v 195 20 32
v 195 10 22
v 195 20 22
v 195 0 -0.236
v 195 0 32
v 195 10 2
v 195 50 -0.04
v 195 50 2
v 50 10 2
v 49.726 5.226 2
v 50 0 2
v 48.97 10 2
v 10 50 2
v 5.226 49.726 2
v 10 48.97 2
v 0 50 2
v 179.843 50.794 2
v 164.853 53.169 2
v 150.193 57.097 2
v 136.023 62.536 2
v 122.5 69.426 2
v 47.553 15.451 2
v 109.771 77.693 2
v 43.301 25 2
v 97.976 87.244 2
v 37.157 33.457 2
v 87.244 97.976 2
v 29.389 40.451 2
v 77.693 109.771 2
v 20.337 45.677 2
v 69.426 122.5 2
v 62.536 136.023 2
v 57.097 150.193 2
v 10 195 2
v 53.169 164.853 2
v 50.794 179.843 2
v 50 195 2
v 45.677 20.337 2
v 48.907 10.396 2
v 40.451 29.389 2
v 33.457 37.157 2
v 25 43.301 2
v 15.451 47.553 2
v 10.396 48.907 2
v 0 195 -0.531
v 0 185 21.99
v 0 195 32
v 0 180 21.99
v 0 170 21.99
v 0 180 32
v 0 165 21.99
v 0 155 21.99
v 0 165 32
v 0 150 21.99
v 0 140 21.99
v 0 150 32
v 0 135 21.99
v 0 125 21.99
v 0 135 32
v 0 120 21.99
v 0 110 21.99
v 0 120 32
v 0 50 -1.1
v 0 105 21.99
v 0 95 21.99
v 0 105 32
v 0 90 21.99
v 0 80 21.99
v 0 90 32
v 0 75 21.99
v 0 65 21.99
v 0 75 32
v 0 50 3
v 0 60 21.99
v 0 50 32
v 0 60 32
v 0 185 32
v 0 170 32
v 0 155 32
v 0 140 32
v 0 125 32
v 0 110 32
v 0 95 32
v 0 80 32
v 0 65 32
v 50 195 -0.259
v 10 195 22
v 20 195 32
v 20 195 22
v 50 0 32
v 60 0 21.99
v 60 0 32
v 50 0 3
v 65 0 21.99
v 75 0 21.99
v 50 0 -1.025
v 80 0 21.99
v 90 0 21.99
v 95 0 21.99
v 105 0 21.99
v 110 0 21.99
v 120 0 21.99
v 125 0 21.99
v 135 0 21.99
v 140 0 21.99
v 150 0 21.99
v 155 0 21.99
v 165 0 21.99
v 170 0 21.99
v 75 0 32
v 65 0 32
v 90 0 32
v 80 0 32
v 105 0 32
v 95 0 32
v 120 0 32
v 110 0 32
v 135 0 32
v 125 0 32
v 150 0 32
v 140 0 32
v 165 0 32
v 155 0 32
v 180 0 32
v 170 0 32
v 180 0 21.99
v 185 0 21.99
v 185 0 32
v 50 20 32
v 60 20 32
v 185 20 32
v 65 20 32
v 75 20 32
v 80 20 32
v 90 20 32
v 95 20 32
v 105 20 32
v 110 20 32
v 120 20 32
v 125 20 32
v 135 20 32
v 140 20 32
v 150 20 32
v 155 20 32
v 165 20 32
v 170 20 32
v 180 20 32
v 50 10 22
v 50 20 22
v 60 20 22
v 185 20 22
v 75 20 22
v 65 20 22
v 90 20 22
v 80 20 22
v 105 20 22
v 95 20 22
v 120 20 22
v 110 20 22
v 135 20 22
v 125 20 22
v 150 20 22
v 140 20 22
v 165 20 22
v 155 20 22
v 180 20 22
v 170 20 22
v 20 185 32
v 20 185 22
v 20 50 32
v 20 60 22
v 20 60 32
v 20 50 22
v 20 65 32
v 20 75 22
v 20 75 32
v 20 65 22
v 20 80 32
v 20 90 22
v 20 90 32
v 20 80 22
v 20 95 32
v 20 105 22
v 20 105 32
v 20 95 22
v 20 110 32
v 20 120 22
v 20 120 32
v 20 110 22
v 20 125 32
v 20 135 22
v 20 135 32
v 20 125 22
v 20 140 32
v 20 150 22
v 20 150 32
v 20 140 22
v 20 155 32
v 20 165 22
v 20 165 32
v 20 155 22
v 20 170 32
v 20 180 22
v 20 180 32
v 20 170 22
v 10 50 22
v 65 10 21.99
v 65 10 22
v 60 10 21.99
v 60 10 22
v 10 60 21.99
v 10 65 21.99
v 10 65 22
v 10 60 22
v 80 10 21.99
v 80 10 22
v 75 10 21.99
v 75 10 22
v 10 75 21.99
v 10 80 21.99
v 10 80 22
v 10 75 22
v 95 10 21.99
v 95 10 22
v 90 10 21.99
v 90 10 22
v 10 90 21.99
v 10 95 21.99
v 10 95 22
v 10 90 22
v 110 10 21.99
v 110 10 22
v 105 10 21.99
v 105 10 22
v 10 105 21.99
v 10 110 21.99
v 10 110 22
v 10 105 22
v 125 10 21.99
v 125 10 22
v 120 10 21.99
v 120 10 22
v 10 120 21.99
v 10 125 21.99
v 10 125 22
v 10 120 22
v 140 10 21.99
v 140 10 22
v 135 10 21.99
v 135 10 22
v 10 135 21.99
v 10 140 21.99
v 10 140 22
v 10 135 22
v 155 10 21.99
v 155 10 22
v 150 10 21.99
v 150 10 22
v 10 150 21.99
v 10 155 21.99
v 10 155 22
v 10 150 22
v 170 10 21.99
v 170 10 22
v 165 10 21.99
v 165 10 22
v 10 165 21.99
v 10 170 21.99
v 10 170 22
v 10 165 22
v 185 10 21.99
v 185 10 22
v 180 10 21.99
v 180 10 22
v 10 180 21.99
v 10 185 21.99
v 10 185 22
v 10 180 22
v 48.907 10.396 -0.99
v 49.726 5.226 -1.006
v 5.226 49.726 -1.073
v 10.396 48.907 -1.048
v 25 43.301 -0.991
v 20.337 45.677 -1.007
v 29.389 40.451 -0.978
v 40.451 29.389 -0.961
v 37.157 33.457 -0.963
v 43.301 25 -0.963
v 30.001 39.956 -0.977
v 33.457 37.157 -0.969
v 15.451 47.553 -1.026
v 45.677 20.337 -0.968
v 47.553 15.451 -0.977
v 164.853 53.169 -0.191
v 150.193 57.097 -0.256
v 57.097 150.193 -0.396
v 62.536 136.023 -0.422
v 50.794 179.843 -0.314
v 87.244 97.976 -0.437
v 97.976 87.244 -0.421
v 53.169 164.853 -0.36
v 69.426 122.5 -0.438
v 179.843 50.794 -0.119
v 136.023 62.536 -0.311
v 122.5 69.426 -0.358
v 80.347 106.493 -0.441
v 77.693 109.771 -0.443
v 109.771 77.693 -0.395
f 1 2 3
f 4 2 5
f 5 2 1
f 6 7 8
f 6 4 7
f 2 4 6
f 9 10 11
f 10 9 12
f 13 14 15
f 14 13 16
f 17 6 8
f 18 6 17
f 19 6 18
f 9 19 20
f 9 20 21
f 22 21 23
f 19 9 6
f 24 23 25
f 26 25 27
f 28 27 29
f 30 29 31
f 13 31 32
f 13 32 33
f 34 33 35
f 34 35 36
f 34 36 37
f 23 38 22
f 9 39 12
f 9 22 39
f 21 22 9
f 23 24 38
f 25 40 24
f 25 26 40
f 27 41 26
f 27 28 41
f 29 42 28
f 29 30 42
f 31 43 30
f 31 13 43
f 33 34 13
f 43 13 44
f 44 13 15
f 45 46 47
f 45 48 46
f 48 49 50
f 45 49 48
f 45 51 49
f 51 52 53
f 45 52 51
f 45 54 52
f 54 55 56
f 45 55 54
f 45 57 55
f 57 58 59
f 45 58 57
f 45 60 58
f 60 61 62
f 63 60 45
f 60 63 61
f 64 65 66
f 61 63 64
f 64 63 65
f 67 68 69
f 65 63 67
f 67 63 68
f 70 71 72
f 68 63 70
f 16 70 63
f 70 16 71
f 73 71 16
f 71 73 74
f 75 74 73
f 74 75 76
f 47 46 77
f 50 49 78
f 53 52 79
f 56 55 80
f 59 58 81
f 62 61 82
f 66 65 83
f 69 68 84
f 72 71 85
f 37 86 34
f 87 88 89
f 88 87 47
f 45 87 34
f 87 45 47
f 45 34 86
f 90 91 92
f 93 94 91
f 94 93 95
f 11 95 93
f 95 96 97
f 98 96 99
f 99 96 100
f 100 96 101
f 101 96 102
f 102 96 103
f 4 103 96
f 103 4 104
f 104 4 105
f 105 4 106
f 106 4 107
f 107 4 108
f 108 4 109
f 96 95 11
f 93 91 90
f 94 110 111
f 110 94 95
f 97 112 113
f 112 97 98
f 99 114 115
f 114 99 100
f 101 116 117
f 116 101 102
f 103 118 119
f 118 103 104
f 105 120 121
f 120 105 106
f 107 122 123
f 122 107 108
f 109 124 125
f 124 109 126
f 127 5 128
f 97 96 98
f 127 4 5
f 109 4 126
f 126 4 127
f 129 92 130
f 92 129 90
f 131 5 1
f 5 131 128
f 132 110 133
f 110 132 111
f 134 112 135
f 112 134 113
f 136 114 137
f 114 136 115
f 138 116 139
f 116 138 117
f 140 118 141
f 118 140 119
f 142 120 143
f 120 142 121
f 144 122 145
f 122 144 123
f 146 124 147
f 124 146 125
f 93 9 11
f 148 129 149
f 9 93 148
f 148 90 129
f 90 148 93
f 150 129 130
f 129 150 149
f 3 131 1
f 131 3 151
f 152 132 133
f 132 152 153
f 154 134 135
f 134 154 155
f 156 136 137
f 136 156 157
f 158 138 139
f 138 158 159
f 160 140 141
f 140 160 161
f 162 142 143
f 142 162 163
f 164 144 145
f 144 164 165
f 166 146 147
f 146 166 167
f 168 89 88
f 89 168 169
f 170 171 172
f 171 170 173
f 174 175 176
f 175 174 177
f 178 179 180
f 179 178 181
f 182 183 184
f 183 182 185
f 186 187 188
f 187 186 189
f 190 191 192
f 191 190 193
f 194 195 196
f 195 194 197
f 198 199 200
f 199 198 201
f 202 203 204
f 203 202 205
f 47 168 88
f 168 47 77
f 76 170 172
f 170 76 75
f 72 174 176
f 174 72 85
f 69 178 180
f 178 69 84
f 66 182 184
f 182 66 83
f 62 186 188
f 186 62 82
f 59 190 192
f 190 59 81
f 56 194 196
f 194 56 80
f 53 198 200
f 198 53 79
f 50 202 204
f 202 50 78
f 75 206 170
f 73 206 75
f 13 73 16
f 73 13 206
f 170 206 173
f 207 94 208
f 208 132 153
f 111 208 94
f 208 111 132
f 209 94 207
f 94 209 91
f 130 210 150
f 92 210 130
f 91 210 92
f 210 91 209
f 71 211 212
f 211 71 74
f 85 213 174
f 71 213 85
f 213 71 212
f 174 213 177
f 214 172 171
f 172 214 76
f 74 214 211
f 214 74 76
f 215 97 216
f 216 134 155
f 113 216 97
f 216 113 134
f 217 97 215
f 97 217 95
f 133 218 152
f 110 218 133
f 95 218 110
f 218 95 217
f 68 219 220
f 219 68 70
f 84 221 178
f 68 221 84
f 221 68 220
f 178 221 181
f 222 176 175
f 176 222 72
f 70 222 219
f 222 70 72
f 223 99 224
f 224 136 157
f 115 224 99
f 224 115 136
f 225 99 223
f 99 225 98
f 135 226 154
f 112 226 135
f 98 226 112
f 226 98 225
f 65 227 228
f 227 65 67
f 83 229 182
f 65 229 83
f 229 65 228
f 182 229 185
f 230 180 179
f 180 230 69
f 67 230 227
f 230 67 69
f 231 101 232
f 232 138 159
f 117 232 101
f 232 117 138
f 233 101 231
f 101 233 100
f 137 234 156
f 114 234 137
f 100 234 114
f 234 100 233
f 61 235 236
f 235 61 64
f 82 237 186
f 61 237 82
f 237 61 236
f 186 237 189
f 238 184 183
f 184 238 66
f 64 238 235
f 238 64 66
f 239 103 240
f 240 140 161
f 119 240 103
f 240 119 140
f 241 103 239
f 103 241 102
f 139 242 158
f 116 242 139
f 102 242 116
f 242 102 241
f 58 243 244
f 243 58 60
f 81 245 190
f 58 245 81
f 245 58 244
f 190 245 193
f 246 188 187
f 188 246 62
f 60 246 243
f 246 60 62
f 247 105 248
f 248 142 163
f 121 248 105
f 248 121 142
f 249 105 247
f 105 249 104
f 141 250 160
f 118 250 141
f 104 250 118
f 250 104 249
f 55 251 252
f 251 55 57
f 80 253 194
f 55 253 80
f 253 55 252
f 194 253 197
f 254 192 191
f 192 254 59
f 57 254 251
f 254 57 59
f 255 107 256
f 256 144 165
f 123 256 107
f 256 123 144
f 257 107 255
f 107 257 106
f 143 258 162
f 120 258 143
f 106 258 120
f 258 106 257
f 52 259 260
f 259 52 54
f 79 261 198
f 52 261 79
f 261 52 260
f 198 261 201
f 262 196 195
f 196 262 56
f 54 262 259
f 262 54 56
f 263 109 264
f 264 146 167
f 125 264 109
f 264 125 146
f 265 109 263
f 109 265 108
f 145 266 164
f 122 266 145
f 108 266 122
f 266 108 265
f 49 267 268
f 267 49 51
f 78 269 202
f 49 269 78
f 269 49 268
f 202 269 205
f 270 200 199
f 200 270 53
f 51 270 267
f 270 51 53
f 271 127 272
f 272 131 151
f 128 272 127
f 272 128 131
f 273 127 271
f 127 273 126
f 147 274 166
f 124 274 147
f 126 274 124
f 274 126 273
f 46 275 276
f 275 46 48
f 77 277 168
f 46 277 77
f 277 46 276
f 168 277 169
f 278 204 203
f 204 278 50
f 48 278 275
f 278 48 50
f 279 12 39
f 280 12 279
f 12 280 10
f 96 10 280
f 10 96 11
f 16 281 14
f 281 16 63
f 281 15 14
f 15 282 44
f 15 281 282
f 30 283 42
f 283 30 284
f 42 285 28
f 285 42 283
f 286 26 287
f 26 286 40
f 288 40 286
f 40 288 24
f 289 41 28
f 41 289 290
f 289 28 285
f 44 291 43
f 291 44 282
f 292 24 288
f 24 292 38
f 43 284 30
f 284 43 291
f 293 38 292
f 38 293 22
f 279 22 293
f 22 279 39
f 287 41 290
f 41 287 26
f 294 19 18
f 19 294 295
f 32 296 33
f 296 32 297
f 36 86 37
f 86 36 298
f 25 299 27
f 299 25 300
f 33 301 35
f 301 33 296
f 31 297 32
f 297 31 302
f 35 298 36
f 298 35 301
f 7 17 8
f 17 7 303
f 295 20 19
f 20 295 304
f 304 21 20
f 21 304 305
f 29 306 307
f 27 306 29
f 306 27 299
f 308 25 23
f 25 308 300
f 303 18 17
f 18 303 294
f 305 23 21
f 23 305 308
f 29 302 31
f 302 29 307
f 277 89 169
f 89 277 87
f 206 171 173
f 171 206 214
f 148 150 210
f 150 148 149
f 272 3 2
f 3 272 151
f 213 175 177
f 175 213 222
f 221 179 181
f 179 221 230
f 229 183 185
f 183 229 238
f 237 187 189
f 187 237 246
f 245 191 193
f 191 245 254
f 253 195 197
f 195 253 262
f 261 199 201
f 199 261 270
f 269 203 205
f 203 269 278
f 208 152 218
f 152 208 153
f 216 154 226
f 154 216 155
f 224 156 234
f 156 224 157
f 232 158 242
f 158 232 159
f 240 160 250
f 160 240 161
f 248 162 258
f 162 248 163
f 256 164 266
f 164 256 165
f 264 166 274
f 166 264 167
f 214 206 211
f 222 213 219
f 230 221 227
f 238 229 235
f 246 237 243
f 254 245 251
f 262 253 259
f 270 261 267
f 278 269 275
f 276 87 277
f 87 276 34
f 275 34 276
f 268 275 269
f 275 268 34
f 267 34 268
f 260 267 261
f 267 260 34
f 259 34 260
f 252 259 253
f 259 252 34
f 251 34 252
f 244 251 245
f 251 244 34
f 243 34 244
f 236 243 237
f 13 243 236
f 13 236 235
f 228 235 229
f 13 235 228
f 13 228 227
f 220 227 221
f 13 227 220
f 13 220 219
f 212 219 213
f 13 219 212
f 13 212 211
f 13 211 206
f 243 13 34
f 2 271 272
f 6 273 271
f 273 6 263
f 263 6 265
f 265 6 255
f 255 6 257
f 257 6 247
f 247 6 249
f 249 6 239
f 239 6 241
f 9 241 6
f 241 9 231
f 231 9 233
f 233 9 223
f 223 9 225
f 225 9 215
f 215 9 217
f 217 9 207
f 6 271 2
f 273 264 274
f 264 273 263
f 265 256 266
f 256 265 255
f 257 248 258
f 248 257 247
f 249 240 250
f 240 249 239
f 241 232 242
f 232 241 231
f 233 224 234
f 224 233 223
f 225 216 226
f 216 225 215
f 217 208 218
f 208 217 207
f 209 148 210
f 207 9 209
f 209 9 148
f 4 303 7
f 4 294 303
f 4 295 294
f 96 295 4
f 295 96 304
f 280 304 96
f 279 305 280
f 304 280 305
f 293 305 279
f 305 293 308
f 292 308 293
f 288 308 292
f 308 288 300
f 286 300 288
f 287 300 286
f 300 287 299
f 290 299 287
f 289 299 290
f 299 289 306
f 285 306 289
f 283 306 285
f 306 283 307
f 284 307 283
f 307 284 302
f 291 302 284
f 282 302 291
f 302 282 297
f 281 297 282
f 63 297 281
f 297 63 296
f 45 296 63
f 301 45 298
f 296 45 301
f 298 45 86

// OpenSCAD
bt=20;  // board thickness
bw=300; // board width
bl=400; // board length
at=2;   // arc thickness

co=50;  // corner offset

th=10;  // tooth height
tt=10;  // tooth thickness
dt=5;   // distance between teeth
nt=10;  // number of teeth

w=nt*tt+(nt-1)*dt; // width row of teeth
echo(Row_of_teeth = w);

ax=atan(at/(bw-co+bt/2)/sqrt(2));
echo(ax_= ax);
ay=atan(at/(bl-co+bt/2)/sqrt(2));
echo(ay_= ay);


difference()
{
    union()
    {
        color("Yellow")
        translate([0,0,-2*at])
        cube([w+co,w+co,3*at]);
        
        color("Blue")
        translate([co,0,at-0.01])
        cube([w,bt,bt+th+0.01]);

        color("Purple")
        translate([0,co,at-0.01])
        cube([bt,w,bt+th+0.01]);
    };

    color("Green")
    translate([0,0,0])
    cylinder(h=3*at,r=co,center=true, $fn=60);

    color("Red")
    translate([w+co,w+co,0])
    cylinder(h=3*at,r=w,center=true, $fn=60);
    
    color("Orange")
    translate([bt/2,bt/2,at])
    cube([bw,bl,bt]);
    
    color("Gray")
    translate([bw+bt/2,bl+bt/2,at])
    rotate([ay,-ax,0])
    translate([-bw-1-bt/2,-bl-1-bt/2,-bt])
    cube([bw+1+bt/2,bl+1+bt/2,bt]);
    
    color("Fuchsia")
    for(n=[1:nt-1])
    {
        translate([co-dt+n*(tt+dt),-0.5,at+bt-0.01])
        cube([dt,bt+1,th+1]);
        
        translate([-0.5,co-dt+n*(tt+dt),at+bt-0.01])
        cube([bt+1,dt,th+1]);
    };
};
